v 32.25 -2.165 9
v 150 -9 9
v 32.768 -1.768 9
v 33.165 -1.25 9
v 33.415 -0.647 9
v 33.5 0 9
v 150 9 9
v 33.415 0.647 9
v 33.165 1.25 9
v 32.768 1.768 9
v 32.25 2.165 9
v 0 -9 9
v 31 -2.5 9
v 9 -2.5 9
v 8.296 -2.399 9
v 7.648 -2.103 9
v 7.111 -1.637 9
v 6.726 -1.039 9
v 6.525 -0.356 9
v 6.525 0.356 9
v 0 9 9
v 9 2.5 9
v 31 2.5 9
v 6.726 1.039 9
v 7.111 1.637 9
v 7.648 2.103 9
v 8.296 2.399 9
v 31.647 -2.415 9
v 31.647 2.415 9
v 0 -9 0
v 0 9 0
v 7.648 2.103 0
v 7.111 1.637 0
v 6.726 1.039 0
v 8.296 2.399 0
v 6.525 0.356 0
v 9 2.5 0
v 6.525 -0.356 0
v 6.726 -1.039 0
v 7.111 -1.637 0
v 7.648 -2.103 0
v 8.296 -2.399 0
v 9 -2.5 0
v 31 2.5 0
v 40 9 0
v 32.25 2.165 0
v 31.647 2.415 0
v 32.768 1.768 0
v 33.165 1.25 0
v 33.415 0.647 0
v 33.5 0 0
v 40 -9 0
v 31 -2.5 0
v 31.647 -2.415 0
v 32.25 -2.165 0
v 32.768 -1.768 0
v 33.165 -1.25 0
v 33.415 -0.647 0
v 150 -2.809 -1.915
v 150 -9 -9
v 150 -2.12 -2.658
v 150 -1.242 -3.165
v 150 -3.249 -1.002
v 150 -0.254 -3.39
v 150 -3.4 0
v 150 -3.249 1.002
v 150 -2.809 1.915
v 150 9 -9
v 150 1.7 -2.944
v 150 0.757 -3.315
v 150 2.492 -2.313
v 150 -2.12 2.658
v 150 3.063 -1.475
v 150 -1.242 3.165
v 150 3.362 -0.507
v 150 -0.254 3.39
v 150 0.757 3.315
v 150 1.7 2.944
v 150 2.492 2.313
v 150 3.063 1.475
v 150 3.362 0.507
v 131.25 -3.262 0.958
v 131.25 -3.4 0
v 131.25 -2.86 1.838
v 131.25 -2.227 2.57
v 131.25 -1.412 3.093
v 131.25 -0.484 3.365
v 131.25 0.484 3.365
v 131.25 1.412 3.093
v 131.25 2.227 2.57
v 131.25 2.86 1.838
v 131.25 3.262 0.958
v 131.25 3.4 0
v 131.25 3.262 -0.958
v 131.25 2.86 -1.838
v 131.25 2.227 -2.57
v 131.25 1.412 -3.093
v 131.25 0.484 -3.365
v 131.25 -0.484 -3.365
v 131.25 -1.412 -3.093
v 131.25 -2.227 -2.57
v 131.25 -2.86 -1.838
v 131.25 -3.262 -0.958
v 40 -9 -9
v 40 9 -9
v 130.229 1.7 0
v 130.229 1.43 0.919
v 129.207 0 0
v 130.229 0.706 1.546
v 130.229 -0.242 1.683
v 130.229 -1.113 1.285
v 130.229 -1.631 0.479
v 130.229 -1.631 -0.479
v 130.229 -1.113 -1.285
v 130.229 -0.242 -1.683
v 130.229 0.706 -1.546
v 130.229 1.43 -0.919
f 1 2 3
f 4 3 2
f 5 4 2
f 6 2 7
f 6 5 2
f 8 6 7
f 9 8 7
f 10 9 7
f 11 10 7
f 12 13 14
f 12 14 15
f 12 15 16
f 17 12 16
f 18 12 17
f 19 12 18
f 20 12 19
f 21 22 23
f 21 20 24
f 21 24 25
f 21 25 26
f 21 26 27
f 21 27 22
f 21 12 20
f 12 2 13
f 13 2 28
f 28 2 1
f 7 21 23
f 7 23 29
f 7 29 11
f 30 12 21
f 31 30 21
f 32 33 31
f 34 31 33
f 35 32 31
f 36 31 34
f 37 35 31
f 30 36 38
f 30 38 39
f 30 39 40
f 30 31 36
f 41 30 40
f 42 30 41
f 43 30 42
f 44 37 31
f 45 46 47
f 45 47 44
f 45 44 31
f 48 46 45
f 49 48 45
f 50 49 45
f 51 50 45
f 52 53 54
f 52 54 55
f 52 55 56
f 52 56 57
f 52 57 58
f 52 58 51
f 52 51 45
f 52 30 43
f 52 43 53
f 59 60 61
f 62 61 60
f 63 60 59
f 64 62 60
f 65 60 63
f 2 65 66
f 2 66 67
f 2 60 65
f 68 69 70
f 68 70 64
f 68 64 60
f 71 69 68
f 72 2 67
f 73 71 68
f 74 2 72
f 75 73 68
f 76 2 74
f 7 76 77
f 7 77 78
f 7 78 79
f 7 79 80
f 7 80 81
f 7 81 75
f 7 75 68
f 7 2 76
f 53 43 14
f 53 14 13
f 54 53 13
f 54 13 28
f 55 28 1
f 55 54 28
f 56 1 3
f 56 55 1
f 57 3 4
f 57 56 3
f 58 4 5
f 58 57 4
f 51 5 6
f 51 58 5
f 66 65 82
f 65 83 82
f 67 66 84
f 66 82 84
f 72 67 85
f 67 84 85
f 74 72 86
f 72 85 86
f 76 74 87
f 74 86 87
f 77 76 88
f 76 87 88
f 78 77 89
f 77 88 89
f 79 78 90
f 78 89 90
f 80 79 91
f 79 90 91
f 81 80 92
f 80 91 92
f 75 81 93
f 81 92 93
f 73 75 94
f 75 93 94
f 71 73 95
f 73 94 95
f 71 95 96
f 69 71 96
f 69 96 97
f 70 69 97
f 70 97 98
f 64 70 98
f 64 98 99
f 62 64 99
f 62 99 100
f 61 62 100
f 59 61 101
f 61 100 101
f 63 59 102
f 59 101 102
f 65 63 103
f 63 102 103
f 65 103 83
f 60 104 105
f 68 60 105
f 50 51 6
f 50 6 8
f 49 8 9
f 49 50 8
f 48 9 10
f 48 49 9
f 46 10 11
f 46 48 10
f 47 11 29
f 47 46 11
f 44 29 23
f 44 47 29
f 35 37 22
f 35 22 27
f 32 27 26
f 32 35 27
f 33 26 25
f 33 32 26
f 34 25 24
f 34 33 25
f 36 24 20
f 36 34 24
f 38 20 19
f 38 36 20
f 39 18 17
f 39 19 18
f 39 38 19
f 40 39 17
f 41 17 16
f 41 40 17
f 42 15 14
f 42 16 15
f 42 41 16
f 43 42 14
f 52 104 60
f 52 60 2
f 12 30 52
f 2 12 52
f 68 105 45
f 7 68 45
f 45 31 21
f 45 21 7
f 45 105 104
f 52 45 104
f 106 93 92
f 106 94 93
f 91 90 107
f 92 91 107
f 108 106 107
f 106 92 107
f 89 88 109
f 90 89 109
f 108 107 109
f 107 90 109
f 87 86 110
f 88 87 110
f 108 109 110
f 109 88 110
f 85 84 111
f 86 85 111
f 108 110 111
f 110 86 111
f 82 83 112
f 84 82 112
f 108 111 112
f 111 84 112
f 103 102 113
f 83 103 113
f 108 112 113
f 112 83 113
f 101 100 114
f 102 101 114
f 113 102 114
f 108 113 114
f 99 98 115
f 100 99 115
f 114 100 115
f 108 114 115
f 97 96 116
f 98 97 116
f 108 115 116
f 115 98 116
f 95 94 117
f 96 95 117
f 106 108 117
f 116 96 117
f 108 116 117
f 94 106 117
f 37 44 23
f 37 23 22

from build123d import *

# Parameters (mm, degrees)
F0_W     = 18
F0_H     = 18
F1_DEPTH = 150
F2_W     = 40
F2_H     = 18
F3_DEPTH = 9
F4_DEPTH = 25
F6_D     = 6.8
F6_DEPTH = 18.75
F6_TIP   = 2.0429261047


with BuildPart() as f1:
    # F0 (on Right) → F1 (new body)
    with BuildSketch(Plane.YZ):
        Rectangle(F0_W, F0_H)
    extrude(amount=F1_DEPTH)

    # F2 (on face) → F3 (cut)
    with BuildSketch(Plane(origin=(0, 0, -9), x_dir=(1, 0, 0), z_dir=(0, 0, -1))):
        with Locations((20, 0)):
            Rectangle(F2_W, F2_H)
        with BuildLine():
            ThreePointArc((9, -2.5), (6.5, 0), (9, 2.5))
            Line((9, 2.5), (31, 2.5))
            ThreePointArc((31, 2.5), (32.767766953, 1.767766953), (33.5, 0))
            ThreePointArc((33.5, 0), (32.767766953, -1.767766953), (31, -2.5))
            Line((31, -2.5), (9, -2.5))
        make_face(mode=Mode.SUBTRACT)
    extrude(amount=-F3_DEPTH, mode=Mode.SUBTRACT)

    # F4 (cut): a face of the model
    f4_faces = [f1.faces().sort_by_distance(p)[0] for p in [
        (20, 0, -9),
    ]]
    extrude(f4_faces, amount=-F4_DEPTH, mode=Mode.SUBTRACT)

    # F6
    with Locations(Plane.YZ.offset(150)):
        with Locations((0, 0)):
            Hole(F6_D / 2, depth=F6_DEPTH)
            with Locations((0, 0, -(F6_DEPTH + F6_TIP / 2))):  # 118° drill point
                Cone(0, F6_D / 2, F6_TIP, mode=Mode.SUBTRACT)


solid = f1.part
